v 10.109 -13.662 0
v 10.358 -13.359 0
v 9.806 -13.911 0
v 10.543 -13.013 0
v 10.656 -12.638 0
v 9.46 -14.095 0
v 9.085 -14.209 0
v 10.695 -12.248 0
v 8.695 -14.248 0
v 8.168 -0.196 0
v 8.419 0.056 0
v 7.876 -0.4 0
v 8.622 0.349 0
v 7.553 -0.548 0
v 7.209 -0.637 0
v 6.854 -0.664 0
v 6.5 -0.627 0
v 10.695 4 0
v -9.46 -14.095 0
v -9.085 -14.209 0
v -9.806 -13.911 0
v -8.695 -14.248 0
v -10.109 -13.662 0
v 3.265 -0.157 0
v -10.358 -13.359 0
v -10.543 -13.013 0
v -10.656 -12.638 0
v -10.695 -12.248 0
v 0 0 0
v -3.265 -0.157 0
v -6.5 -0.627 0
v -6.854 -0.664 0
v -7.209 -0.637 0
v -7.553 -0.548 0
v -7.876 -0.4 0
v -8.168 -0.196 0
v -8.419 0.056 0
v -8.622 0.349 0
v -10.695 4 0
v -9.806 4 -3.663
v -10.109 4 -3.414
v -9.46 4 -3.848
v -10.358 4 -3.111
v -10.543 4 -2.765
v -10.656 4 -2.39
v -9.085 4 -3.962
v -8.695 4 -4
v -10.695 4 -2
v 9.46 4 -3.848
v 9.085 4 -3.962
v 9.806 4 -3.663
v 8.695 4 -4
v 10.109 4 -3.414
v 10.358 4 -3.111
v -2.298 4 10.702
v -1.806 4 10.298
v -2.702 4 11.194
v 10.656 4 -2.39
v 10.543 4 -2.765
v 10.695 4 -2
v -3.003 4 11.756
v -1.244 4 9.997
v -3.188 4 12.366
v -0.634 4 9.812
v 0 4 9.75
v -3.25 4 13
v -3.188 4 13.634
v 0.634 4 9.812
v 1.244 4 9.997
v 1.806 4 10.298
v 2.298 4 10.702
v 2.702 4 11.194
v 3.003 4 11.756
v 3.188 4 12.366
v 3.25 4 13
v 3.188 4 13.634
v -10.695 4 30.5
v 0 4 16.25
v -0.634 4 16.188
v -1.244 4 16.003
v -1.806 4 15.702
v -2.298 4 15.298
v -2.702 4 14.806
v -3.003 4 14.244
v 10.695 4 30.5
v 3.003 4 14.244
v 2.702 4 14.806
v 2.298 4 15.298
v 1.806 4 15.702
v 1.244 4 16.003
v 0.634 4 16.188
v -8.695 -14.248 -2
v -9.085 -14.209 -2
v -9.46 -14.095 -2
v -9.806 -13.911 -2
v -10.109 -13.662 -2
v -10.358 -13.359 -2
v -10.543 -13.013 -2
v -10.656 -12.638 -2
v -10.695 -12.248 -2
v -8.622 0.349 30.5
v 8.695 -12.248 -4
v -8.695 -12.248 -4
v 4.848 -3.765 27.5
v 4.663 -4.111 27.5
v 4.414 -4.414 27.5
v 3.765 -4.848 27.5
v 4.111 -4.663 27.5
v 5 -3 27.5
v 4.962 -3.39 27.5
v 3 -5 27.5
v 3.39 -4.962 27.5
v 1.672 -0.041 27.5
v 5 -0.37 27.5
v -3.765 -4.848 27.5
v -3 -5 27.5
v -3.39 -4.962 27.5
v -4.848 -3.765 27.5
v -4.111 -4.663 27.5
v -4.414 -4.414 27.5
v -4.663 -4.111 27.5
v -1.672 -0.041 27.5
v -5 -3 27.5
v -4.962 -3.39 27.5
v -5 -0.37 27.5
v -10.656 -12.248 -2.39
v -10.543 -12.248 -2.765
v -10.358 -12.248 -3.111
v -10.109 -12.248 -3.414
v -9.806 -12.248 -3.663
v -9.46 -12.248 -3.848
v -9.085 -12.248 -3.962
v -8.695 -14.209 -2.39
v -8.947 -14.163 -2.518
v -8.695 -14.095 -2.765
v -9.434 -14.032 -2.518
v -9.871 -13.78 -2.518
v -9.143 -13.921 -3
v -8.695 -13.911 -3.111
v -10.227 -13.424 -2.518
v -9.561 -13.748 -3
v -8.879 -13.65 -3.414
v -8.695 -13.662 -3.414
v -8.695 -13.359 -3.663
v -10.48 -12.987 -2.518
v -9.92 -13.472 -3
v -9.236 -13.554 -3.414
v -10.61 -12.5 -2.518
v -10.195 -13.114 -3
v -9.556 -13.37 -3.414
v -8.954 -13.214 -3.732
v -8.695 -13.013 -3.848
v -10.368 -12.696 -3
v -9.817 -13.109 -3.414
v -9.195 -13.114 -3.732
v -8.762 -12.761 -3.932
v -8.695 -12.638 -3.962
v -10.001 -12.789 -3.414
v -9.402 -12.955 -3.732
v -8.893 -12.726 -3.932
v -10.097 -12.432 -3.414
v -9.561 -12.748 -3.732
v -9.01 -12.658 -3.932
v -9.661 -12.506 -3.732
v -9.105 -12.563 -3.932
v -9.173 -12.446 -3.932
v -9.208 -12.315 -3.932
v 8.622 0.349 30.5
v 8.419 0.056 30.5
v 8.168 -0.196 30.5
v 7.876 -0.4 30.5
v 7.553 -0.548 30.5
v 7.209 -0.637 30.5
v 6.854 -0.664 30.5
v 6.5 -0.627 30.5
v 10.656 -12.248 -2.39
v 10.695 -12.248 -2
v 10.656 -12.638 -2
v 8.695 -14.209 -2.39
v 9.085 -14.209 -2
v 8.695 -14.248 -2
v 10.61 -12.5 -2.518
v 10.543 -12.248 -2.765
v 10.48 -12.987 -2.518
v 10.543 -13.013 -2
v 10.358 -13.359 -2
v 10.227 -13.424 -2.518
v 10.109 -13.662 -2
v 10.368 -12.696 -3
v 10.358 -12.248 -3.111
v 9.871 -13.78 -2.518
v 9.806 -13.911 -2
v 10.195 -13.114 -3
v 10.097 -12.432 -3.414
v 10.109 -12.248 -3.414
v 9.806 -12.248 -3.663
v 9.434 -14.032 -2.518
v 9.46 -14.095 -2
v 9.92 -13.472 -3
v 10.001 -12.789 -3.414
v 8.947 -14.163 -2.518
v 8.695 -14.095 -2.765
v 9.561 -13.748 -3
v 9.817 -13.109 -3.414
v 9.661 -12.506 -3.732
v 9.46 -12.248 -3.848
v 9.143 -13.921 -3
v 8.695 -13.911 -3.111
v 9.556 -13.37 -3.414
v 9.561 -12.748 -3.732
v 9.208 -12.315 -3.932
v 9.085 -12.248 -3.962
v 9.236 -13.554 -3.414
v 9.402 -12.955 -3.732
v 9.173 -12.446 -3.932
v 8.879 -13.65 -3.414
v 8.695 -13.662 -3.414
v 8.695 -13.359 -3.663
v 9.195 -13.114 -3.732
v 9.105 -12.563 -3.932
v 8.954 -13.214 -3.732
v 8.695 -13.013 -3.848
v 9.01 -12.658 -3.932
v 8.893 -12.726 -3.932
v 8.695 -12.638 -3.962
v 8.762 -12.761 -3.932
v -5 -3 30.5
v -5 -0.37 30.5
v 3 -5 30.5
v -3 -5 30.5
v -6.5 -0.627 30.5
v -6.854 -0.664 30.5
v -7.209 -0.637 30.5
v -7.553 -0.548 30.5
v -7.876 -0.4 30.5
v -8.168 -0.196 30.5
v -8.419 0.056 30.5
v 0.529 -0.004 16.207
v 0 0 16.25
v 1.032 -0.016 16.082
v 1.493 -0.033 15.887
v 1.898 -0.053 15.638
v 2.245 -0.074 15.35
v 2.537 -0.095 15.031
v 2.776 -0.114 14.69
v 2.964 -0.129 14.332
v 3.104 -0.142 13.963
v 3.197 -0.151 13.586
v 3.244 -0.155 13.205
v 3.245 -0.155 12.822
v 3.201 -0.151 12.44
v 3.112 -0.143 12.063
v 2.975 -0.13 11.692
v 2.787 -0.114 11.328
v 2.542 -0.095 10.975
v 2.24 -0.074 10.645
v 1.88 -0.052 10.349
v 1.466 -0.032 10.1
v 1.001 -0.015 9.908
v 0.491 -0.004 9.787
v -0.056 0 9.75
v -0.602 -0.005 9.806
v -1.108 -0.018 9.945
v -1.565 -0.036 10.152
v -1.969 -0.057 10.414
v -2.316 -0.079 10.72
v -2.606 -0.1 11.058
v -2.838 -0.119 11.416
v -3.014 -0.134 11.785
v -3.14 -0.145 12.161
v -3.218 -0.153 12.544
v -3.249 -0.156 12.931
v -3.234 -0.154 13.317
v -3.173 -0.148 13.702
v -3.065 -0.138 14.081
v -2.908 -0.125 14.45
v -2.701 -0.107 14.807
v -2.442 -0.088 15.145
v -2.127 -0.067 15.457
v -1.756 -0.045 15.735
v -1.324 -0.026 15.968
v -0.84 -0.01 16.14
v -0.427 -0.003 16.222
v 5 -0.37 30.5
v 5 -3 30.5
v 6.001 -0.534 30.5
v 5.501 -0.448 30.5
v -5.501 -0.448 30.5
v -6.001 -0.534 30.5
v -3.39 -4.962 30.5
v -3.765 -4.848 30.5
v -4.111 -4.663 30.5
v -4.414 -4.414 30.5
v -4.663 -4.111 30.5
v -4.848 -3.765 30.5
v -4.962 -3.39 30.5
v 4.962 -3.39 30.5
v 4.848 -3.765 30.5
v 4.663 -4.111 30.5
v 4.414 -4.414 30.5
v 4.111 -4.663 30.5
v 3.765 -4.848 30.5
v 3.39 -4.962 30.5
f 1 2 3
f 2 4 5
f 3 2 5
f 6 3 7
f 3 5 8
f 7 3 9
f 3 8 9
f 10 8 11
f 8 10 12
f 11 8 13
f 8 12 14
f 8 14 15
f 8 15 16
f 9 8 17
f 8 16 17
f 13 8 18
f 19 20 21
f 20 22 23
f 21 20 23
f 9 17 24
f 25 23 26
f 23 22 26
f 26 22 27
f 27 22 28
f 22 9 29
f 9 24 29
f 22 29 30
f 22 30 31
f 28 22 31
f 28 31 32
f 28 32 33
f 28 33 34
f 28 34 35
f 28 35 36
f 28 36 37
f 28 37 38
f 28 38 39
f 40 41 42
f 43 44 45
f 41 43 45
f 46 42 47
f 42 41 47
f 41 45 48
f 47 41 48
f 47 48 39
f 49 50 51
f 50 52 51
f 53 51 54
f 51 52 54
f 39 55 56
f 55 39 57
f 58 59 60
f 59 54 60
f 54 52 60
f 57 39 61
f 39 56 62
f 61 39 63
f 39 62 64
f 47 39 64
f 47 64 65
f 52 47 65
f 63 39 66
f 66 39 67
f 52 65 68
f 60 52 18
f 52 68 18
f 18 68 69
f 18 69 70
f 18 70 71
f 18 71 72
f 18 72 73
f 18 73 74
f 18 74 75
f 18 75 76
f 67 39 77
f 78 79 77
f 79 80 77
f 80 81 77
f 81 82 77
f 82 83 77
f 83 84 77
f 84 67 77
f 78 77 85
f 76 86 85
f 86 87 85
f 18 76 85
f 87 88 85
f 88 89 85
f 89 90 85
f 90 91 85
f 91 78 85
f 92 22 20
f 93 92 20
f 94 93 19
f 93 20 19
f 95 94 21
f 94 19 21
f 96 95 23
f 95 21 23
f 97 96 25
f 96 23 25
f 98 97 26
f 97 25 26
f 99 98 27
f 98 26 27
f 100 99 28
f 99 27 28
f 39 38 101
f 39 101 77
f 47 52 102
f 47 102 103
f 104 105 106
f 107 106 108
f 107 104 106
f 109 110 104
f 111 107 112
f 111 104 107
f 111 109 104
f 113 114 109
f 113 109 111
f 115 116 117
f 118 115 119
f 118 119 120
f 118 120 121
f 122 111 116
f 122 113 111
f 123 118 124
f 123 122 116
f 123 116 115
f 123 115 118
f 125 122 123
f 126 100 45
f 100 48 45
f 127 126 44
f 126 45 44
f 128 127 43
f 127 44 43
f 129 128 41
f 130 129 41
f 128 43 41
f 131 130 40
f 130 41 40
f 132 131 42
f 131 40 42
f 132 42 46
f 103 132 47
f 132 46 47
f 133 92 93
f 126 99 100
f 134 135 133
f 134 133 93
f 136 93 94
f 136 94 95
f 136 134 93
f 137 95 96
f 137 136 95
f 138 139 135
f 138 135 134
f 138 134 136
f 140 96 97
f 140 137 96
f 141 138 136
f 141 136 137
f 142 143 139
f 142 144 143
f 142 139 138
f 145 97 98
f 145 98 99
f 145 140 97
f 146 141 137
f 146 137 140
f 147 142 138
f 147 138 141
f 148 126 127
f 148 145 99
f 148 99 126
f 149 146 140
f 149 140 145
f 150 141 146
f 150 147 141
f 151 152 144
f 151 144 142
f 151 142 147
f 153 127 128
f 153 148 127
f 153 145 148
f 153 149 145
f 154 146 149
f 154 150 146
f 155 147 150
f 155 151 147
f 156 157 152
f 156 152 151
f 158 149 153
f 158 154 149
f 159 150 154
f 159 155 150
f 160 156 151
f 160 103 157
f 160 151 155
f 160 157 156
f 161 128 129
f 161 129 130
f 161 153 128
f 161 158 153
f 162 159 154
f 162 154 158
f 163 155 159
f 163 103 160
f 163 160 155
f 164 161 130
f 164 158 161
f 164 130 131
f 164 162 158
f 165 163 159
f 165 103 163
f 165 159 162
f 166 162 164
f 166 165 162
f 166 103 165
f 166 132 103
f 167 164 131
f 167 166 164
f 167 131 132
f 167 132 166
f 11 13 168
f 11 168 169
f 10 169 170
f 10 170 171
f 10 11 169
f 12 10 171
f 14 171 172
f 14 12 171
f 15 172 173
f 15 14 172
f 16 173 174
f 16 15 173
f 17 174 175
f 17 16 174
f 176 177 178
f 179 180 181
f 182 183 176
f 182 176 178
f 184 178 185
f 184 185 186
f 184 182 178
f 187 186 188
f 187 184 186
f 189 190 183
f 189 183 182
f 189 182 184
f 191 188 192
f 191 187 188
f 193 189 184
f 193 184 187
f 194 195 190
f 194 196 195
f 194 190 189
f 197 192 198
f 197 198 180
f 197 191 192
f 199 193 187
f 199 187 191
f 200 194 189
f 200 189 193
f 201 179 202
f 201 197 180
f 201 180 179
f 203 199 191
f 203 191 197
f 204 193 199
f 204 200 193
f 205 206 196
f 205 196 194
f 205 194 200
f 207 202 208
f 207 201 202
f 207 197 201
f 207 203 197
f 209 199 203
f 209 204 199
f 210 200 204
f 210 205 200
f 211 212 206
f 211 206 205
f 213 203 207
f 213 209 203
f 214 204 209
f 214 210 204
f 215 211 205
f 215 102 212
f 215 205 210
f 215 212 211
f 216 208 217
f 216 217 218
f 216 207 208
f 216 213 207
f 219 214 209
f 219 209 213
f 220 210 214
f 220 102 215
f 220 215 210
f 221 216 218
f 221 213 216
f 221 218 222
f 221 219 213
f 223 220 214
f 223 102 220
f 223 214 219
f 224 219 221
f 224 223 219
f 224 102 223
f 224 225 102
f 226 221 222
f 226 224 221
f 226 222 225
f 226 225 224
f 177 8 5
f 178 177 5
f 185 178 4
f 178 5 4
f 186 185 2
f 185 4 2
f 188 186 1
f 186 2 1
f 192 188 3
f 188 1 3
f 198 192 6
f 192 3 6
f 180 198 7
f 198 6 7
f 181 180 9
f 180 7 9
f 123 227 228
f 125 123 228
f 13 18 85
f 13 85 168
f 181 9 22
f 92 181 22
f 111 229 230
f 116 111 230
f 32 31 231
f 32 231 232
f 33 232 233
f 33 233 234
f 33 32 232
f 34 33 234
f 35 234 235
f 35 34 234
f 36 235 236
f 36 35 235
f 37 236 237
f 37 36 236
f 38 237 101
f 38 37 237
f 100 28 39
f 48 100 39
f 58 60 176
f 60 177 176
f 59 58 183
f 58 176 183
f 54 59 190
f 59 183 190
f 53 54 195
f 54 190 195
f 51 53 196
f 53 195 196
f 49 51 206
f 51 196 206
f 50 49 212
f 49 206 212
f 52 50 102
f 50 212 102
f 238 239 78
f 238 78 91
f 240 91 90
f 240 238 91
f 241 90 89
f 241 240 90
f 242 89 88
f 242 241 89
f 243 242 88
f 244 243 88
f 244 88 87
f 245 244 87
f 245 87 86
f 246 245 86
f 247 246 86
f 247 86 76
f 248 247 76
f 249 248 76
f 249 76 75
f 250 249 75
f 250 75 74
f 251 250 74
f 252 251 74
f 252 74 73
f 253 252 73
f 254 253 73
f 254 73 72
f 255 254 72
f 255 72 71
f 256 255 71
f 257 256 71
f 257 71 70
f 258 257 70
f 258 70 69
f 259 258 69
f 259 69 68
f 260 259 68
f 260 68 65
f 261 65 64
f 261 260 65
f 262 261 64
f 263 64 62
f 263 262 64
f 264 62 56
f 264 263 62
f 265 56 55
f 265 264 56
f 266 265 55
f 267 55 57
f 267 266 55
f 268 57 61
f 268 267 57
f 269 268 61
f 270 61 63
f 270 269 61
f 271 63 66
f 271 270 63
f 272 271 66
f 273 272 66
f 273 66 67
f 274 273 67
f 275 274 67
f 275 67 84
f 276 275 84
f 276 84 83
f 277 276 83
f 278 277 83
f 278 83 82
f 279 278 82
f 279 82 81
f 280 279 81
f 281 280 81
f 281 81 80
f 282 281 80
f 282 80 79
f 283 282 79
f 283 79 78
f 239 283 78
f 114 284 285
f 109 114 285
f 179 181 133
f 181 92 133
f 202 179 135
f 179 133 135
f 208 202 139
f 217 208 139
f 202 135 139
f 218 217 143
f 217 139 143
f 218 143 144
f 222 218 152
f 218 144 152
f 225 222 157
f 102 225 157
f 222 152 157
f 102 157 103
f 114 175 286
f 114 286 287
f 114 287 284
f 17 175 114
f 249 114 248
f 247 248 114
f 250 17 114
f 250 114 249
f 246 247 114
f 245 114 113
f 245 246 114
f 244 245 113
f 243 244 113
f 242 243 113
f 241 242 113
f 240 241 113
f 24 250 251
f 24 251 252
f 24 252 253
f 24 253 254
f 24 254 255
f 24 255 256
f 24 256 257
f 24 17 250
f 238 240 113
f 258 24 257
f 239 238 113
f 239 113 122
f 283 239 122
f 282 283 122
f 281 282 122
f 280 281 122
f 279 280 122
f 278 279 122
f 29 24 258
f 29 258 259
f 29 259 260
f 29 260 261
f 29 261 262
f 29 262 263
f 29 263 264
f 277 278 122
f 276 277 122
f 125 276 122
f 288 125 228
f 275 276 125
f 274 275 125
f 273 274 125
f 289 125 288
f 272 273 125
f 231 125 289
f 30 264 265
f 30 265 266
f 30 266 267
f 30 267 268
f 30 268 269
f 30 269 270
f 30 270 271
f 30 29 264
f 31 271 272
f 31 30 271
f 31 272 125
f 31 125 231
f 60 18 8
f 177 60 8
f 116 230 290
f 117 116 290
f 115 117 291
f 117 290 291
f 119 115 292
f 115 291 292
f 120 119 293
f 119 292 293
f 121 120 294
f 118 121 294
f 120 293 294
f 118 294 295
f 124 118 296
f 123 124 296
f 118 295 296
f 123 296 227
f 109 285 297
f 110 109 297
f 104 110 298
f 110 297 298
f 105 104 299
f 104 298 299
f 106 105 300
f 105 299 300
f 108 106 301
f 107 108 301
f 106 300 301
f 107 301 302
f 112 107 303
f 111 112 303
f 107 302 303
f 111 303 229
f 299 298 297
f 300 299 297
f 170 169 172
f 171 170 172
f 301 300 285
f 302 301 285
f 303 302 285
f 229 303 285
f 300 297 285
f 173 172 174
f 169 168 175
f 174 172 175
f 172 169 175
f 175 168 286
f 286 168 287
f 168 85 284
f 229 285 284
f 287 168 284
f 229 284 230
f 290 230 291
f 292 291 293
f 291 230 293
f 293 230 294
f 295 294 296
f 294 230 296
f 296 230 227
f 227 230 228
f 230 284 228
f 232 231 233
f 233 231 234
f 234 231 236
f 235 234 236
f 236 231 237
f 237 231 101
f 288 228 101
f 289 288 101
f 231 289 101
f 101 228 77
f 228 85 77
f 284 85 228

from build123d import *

# Parameters (mm, degrees)
BOSS_EXTRUDE1_DEPTH     = 30.5
BOSS_EXTRUDE2_DEPTH     = 4
CUT_EXTRUDE1_DEPTH      = 36.321701763
CUT_EXTRUDE1_DEPTH_BACK = 36.321701763
SKETCH3_R               = 3.25
BOSS_EXTRUDE3_DEPTH     = 3
FILLET2_R               = 2


with BuildPart() as part:
    # Sketch1 → Boss-Extrude1 (new body)
    with BuildSketch(Plane.XY):
        with BuildLine():
            Line((-8.621574968, 0.348529625), (-10.694763671, 4))
            Line((-10.694763671, 4), (10.694763671, 4))
            Line((10.694763671, 4), (8.621574968, 0.348529625))
            ThreePointArc((8.621574968, 0.348529625), (7.717960529, -0.481070004), (6.5, -0.627106808))
            ThreePointArc((6.5, -0.627106808), (0, 0), (-6.5, -0.627106808))
            ThreePointArc((-6.5, -0.627106808), (-7.717960529, -0.481070004), (-8.621574968, 0.348529625))
        make_face()
    extrude(amount=BOSS_EXTRUDE1_DEPTH)

    # Sketch2 → Boss-Extrude2 (add)
    with BuildSketch(Plane.XY):
        with BuildLine():
            Line((10.694763671, 4), (10.694763671, -12.24761894))
            ThreePointArc((10.694763671, -12.24761894), (10.108977233, -13.661832502), (8.694763671, -14.24761894))
            Line((8.694763671, -14.24761894), (-8.694763671, -14.24761894))
            ThreePointArc((-8.694763671, -14.24761894), (-10.108977233, -13.661832502), (-10.694763671, -12.24761894))
            Line((-10.694763671, -12.24761894), (-10.694763671, 4))
            Line((-10.694763671, 4), (10.694763671, 4))
        make_face()
    extrude(amount=-BOSS_EXTRUDE2_DEPTH)

    # Sketch3 → Cut-Extrude1 (cut, two sides: drawn at the far end of the back side and taken through both)
    with BuildSketch(Plane(origin=(0, 0, 0), x_dir=(1, 0, 0), z_dir=(0, 1, 0)).offset(-CUT_EXTRUDE1_DEPTH_BACK)):
        with Locations(Location((0, -13, 0), (0, 0, 270))):
            Circle(SKETCH3_R)
    extrude(amount=CUT_EXTRUDE1_DEPTH + CUT_EXTRUDE1_DEPTH_BACK, mode=Mode.SUBTRACT)

    # Sketch4 → Boss-Extrude3 (add)
    with BuildSketch(Plane.XY.offset(30.5)):
        with BuildLine():
            Line((-5, 4), (5, 4))
            Line((5, 4), (5, -3))
            ThreePointArc((5, -3), (4.414213562, -4.414213562), (3, -5))
            Line((3, -5), (-3, -5))
            ThreePointArc((-3, -5), (-4.414213562, -4.414213562), (-5, -3))
            Line((-5, -3), (-5, 4))
        make_face()
    extrude(amount=-BOSS_EXTRUDE3_DEPTH)

    # Fillet2
    fillet2_edges = [part.edges().sort_by_distance(p)[0] for p in [
        (-10.108977233, -13.661832502, -4),
        (-10.694763671, -4.12380947, -4),
        (10.694763671, -4.12380947, -4),
        (10.108977233, -13.661832502, -4),
        (0, -14.24761894, -4),
    ]]
    fillet(fillet2_edges, radius=FILLET2_R)


solid = part.part
